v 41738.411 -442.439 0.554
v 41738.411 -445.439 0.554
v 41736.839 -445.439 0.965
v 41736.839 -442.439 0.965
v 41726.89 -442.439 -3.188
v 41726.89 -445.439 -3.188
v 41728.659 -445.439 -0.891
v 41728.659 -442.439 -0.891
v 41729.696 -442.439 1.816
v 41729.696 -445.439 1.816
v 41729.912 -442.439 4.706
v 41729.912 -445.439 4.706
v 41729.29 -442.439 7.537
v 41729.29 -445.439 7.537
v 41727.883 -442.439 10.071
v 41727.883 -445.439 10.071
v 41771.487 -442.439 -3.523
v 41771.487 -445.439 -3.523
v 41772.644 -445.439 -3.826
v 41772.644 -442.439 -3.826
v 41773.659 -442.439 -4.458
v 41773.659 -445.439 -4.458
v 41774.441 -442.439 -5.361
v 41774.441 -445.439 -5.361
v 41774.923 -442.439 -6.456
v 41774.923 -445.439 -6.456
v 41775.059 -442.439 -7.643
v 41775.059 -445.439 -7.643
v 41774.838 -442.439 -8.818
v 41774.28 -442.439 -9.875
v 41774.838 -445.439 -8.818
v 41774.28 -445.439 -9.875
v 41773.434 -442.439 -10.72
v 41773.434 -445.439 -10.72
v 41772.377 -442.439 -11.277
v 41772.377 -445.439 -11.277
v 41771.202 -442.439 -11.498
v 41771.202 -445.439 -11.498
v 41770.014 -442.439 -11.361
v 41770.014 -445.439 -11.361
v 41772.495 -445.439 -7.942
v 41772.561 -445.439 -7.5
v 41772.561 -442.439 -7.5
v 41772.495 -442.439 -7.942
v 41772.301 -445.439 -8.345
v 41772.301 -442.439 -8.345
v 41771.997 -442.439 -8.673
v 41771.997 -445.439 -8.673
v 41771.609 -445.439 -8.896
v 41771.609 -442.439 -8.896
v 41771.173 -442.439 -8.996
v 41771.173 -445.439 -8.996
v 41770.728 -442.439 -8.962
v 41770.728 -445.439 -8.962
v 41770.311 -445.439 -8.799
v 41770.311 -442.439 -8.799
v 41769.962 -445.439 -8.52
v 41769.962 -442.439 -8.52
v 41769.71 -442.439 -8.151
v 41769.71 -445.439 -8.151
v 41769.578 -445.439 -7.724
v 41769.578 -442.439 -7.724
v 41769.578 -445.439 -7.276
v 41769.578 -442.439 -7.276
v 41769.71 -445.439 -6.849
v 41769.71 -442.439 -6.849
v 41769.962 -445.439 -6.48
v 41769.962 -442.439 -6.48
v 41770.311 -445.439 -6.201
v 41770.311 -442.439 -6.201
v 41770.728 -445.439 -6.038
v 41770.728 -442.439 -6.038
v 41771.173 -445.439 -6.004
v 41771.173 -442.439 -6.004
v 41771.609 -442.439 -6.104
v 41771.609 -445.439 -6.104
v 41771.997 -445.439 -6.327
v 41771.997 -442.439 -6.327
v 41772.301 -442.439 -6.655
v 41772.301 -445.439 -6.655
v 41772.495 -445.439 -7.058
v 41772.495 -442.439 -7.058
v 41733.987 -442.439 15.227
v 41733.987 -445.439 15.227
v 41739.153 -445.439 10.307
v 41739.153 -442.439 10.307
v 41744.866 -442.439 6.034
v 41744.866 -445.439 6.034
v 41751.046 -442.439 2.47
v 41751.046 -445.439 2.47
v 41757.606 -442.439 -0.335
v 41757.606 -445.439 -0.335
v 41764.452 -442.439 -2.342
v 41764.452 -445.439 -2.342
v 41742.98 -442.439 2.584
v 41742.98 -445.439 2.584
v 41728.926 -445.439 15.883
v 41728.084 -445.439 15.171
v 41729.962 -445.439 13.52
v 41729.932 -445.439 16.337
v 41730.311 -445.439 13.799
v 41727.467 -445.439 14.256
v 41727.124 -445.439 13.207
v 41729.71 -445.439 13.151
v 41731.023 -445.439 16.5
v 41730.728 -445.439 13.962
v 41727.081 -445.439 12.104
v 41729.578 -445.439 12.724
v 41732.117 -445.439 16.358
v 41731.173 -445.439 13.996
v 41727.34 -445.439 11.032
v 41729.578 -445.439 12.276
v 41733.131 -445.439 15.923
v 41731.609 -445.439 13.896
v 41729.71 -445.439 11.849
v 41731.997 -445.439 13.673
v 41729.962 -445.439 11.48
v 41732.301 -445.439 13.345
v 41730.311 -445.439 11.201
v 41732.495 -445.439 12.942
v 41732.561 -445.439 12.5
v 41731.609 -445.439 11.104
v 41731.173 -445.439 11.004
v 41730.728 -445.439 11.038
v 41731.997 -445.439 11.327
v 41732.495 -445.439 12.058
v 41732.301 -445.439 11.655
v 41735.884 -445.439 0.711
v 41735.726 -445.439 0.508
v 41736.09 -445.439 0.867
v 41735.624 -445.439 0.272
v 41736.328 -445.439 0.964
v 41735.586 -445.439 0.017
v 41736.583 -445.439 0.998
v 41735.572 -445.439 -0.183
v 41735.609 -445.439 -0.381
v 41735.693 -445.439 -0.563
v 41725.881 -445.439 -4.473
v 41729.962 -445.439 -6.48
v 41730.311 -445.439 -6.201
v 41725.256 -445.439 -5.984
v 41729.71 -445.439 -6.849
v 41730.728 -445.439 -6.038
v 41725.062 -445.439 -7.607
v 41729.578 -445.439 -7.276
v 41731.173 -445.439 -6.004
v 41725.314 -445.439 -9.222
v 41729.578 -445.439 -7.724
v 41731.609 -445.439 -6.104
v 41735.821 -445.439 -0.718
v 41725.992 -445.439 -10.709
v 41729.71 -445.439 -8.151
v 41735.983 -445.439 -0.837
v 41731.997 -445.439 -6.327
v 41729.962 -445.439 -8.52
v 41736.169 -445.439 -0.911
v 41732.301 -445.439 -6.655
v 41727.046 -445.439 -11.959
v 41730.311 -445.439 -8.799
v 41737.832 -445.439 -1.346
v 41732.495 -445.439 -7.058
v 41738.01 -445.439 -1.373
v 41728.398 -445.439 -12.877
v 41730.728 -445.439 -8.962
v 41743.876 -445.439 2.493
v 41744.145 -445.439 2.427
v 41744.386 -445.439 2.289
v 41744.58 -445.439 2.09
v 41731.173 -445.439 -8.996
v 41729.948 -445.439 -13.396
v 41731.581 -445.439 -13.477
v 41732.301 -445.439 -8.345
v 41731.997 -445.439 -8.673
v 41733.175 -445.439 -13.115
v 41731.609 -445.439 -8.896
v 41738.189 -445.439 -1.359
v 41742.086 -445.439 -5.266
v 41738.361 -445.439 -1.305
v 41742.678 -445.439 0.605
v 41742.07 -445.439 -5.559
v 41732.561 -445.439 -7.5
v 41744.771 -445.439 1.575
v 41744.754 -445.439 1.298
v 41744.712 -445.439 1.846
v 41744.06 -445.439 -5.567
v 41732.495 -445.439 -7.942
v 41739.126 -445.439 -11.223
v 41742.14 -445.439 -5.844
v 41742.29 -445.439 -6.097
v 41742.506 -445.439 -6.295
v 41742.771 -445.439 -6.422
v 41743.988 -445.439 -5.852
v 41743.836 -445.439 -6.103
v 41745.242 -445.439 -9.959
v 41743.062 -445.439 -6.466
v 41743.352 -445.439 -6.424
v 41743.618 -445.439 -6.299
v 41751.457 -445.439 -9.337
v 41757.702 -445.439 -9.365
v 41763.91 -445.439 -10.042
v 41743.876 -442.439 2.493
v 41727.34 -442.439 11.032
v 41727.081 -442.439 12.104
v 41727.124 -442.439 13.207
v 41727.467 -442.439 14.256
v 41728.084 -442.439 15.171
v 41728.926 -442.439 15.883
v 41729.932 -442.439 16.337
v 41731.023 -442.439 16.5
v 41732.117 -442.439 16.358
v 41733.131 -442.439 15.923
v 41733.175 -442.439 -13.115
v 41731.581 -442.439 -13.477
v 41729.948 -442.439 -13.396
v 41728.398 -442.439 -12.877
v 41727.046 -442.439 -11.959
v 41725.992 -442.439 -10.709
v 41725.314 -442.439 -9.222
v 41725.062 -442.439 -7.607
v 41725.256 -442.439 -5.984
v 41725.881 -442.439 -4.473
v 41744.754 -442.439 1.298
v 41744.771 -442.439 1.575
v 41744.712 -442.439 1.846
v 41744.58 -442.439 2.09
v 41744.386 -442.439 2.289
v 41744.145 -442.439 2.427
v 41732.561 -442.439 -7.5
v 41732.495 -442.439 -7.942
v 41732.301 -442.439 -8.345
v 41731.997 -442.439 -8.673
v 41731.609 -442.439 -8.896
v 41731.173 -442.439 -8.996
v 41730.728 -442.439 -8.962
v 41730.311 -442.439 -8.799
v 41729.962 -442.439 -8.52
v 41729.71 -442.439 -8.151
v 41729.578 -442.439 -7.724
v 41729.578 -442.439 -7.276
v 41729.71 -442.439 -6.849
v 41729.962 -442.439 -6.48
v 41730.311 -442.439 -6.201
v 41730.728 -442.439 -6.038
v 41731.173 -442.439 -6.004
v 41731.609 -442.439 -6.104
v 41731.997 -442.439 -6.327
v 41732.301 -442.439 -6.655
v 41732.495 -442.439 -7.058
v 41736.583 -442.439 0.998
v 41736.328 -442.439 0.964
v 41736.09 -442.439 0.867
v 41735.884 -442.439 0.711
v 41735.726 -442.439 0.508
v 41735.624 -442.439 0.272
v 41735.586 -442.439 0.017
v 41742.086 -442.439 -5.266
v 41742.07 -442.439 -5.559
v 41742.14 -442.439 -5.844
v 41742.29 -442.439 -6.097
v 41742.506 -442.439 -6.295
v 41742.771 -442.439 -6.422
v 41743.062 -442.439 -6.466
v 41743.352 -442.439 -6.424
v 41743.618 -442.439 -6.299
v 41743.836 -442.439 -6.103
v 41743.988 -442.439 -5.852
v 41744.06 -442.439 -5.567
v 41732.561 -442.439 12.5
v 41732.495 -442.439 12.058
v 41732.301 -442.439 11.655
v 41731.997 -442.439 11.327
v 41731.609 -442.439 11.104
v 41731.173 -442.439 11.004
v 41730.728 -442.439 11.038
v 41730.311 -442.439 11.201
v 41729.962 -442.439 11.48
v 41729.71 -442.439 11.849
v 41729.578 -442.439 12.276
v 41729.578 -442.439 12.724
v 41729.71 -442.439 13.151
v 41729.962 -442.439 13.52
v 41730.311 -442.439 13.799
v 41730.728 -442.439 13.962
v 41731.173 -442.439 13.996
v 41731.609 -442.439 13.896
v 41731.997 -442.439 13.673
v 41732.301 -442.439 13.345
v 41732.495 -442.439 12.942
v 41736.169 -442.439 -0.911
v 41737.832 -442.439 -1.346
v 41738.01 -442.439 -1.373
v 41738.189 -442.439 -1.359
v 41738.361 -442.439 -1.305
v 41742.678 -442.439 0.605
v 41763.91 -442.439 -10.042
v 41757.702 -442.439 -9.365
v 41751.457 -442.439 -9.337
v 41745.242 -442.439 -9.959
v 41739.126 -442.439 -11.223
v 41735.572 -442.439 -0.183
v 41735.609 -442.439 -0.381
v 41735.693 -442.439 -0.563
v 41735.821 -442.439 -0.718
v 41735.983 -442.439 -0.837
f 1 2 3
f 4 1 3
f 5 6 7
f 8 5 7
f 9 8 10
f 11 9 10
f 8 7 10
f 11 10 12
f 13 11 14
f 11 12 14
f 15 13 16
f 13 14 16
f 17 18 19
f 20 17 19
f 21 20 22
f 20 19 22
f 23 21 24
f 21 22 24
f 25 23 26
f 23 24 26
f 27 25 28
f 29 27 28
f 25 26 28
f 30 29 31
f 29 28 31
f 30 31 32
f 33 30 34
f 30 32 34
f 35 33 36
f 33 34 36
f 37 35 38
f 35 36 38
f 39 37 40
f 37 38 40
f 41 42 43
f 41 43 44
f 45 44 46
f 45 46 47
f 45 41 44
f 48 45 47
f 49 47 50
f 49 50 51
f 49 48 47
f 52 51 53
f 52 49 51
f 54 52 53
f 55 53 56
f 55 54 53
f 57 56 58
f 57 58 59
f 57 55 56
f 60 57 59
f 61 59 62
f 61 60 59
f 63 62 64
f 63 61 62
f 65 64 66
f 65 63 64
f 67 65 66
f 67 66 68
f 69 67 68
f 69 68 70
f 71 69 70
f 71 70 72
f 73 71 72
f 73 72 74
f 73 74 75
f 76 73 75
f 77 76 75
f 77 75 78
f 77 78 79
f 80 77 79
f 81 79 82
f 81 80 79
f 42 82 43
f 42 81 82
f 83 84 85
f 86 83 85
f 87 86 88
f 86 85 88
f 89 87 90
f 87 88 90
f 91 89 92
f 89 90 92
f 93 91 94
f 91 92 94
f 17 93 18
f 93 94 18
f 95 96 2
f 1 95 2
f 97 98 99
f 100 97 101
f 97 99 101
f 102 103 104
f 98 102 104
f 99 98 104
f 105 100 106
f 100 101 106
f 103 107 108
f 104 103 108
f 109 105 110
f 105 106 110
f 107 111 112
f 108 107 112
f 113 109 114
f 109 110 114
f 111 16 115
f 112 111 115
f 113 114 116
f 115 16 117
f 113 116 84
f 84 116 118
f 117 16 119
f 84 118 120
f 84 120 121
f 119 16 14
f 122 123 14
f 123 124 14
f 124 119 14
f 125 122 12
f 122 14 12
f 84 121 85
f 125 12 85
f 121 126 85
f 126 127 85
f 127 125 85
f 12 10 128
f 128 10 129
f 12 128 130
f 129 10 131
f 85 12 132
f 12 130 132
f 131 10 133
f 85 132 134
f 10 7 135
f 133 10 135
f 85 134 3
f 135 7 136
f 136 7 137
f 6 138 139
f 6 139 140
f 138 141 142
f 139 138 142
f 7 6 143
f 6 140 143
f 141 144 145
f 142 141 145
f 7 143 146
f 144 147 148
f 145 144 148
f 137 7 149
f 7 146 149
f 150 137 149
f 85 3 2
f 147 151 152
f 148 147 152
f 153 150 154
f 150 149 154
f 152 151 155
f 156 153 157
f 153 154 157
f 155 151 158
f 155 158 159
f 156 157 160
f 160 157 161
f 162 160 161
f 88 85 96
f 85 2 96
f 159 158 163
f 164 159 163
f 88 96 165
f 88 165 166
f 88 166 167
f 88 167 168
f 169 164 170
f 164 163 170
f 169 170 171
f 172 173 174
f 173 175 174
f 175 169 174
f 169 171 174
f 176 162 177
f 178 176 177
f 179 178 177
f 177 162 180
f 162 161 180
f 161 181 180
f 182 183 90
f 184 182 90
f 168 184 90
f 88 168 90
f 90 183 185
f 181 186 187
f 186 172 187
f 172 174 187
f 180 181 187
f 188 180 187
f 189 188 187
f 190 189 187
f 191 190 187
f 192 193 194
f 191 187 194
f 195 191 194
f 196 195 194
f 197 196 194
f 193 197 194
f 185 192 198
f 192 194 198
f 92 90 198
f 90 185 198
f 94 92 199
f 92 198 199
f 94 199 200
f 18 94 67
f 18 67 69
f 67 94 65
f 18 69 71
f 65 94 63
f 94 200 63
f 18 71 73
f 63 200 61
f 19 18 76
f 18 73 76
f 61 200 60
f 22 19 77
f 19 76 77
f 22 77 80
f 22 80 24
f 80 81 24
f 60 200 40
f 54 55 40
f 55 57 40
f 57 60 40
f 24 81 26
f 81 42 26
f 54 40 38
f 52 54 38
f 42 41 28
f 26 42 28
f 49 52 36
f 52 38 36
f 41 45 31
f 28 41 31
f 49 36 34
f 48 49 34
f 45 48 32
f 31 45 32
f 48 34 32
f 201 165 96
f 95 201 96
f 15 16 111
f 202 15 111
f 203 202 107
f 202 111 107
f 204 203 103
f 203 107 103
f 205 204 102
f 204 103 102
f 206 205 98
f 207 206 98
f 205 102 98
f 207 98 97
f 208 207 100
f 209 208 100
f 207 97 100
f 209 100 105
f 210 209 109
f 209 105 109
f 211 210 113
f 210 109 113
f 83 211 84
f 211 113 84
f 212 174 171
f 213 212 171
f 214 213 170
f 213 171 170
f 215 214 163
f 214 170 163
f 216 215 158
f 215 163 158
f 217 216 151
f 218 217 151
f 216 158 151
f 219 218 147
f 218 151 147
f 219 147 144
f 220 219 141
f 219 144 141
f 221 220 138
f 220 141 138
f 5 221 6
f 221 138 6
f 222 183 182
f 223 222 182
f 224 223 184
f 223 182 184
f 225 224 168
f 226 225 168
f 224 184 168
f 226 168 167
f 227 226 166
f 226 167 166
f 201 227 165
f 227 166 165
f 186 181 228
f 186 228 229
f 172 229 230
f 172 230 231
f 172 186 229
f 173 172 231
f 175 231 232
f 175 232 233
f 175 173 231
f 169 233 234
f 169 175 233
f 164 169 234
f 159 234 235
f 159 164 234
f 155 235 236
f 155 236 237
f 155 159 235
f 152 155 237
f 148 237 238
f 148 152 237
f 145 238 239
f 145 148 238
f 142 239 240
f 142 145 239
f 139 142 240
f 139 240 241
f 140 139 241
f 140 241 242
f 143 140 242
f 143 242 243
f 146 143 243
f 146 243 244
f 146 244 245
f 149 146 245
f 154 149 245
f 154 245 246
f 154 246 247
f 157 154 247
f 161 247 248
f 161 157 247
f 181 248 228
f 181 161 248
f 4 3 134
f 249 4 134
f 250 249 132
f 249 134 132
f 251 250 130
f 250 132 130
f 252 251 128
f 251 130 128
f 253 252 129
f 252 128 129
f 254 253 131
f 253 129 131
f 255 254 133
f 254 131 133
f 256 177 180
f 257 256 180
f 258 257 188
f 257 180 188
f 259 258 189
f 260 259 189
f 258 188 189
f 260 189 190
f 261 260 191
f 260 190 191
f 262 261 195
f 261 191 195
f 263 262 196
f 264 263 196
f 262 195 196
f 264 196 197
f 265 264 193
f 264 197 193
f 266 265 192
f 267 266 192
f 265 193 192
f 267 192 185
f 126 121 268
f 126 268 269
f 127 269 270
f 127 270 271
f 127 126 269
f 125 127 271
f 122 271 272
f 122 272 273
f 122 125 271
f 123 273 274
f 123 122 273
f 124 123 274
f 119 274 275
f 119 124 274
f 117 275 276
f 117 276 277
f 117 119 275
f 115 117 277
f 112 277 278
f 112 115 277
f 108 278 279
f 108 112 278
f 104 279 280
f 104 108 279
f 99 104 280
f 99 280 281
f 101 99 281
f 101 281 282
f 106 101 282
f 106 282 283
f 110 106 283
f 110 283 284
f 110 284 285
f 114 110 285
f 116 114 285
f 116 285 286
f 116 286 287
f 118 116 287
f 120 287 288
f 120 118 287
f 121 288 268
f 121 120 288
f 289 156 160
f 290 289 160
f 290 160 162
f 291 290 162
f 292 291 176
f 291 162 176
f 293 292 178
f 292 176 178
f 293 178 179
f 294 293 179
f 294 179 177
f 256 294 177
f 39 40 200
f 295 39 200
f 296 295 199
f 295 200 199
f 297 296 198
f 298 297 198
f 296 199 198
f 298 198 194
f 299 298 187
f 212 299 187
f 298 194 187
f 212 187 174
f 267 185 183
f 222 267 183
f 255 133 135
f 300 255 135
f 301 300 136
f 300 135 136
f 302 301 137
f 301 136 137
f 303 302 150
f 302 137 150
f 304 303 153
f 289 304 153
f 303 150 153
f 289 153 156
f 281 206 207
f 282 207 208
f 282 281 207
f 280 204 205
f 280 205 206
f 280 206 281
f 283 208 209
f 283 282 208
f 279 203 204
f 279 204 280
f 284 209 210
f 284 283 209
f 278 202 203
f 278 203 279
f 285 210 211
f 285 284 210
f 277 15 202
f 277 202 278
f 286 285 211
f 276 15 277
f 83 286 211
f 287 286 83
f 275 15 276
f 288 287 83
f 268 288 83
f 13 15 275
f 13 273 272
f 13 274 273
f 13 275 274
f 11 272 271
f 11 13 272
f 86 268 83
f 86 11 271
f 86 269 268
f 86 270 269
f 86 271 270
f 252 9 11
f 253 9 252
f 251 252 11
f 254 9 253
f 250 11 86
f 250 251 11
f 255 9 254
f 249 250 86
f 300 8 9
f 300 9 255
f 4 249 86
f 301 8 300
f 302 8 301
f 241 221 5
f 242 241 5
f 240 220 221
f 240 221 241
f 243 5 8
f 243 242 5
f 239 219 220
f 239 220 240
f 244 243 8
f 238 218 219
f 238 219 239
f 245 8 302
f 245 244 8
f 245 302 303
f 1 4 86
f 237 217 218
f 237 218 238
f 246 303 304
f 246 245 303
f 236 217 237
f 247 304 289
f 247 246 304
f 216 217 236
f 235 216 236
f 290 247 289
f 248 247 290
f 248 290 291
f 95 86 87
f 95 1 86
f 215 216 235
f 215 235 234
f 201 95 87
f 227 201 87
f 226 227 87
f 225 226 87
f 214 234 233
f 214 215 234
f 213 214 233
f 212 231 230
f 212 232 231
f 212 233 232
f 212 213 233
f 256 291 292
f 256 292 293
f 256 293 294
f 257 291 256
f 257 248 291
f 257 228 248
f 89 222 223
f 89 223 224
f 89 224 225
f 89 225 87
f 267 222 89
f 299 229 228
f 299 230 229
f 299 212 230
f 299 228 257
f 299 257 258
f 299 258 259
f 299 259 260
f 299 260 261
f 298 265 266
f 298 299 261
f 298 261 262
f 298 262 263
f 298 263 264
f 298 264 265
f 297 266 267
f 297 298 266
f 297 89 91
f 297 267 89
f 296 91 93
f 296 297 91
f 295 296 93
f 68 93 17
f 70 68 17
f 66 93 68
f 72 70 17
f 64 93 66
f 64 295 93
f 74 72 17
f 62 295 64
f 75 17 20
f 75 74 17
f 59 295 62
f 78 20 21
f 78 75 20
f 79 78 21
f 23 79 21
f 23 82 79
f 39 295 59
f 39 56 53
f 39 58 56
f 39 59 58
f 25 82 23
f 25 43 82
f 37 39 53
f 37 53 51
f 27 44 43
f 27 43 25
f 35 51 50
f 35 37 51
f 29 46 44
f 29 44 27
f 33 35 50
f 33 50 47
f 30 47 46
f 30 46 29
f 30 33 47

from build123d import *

# Parameters (mm, degrees)
SALIENTE_EXTRUIR1_OUTLINE_R = 1.5
SALIENTE_EXTRUIR1_DEPTH     = 3
S_LIDO_MOVER_COPIAR1_ANGLE  = 90


# Read off the part's stored shape, not the designer's step: Saliente-Extruir1
with BuildPart() as part:
    # Saliente-Extruir1 outline → Saliente-Extruir1 (new body)
    with BuildSketch(Plane.XY):
        with BuildLine():
            ThreePointArc((41771.487432324, -438.916733549), (41774.992492467, -434.200692189), (41770.014438295, -431.078918755))
            ThreePointArc((41770.014438295, -431.078918755), (41751.456517689, -433.102313751), (41733.174949659, -429.324111148))
            ThreePointArc((41733.174949659, -429.324111148), (41725.991842174, -431.730062122), (41726.889701646, -439.251995491))
            ThreePointArc((41726.889701646, -439.251995491), (41729.909074744, -445.69247761), (41727.882942515, -452.510924062))
            ThreePointArc((41727.882942515, -452.510924062), (41728.480324995, -457.995391332), (41733.987432324, -457.666733549))
            ThreePointArc((41733.987432324, -457.666733549), (41751.046402032, -444.909672965), (41771.487432324, -438.916733549))
        make_face()
        with Locations((41731.061313295, -454.939495491)):
            Circle(SALIENTE_EXTRUIR1_OUTLINE_R, mode=Mode.SUBTRACT)
        with BuildLine():
            Line((41738.411012413, -442.993278413), (41736.838856305, -443.404992792))
            ThreePointArc((41736.838856305, -443.404992792), (41735.982036246, -443.234989406), (41735.585699802, -442.456555601))
            ThreePointArc((41735.585699802, -442.456555601), (41735.69345686, -441.876829753), (41736.169165633, -441.52841218))
            Line((41736.169165633, -441.52841218), (41737.831630416, -441.093055392))
            ThreePointArc((41737.831630416, -441.093055392), (41738.100055673, -441.068468468), (41738.361410126, -441.134426674))
            Line((41738.361410126, -441.134426674), (41742.678233483, -443.044025097))
            Line((41742.678233483, -443.044025097), (41742.08574273, -437.173422628))
            ThreePointArc((41742.08574273, -437.173422628), (41742.914855043, -435.985031701), (41744.060436871, -436.872354922))
            Line((41744.060436871, -436.872354922), (41744.754133415, -443.73758562))
            ThreePointArc((41744.754133415, -443.73758562), (41744.580022463, -444.529990261), (41743.875600122, -444.932493559))
            Line((41743.875600122, -444.932493559), (41742.980225481, -445.023621226))
            Line((41742.980225481, -445.023621226), (41738.411012413, -442.993278413))
        make_face(mode=Mode.SUBTRACT)
        with Locations((41731.061313295, -434.939495491)):
            Circle(SALIENTE_EXTRUIR1_OUTLINE_R, mode=Mode.SUBTRACT)
        with Locations((41771.061313295, -434.939495491)):
            Circle(SALIENTE_EXTRUIR1_OUTLINE_R, mode=Mode.SUBTRACT)
    extrude(amount=SALIENTE_EXTRUIR1_DEPTH)


with BuildPart() as part_1:
    # Sólido-Mover/Copiar1: moved
    add(part.part.rotate(Axis((0, -443.939495491, 1.5), (-1, 0, 0)), S_LIDO_MOVER_COPIAR1_ANGLE))


solid = part_1.part
